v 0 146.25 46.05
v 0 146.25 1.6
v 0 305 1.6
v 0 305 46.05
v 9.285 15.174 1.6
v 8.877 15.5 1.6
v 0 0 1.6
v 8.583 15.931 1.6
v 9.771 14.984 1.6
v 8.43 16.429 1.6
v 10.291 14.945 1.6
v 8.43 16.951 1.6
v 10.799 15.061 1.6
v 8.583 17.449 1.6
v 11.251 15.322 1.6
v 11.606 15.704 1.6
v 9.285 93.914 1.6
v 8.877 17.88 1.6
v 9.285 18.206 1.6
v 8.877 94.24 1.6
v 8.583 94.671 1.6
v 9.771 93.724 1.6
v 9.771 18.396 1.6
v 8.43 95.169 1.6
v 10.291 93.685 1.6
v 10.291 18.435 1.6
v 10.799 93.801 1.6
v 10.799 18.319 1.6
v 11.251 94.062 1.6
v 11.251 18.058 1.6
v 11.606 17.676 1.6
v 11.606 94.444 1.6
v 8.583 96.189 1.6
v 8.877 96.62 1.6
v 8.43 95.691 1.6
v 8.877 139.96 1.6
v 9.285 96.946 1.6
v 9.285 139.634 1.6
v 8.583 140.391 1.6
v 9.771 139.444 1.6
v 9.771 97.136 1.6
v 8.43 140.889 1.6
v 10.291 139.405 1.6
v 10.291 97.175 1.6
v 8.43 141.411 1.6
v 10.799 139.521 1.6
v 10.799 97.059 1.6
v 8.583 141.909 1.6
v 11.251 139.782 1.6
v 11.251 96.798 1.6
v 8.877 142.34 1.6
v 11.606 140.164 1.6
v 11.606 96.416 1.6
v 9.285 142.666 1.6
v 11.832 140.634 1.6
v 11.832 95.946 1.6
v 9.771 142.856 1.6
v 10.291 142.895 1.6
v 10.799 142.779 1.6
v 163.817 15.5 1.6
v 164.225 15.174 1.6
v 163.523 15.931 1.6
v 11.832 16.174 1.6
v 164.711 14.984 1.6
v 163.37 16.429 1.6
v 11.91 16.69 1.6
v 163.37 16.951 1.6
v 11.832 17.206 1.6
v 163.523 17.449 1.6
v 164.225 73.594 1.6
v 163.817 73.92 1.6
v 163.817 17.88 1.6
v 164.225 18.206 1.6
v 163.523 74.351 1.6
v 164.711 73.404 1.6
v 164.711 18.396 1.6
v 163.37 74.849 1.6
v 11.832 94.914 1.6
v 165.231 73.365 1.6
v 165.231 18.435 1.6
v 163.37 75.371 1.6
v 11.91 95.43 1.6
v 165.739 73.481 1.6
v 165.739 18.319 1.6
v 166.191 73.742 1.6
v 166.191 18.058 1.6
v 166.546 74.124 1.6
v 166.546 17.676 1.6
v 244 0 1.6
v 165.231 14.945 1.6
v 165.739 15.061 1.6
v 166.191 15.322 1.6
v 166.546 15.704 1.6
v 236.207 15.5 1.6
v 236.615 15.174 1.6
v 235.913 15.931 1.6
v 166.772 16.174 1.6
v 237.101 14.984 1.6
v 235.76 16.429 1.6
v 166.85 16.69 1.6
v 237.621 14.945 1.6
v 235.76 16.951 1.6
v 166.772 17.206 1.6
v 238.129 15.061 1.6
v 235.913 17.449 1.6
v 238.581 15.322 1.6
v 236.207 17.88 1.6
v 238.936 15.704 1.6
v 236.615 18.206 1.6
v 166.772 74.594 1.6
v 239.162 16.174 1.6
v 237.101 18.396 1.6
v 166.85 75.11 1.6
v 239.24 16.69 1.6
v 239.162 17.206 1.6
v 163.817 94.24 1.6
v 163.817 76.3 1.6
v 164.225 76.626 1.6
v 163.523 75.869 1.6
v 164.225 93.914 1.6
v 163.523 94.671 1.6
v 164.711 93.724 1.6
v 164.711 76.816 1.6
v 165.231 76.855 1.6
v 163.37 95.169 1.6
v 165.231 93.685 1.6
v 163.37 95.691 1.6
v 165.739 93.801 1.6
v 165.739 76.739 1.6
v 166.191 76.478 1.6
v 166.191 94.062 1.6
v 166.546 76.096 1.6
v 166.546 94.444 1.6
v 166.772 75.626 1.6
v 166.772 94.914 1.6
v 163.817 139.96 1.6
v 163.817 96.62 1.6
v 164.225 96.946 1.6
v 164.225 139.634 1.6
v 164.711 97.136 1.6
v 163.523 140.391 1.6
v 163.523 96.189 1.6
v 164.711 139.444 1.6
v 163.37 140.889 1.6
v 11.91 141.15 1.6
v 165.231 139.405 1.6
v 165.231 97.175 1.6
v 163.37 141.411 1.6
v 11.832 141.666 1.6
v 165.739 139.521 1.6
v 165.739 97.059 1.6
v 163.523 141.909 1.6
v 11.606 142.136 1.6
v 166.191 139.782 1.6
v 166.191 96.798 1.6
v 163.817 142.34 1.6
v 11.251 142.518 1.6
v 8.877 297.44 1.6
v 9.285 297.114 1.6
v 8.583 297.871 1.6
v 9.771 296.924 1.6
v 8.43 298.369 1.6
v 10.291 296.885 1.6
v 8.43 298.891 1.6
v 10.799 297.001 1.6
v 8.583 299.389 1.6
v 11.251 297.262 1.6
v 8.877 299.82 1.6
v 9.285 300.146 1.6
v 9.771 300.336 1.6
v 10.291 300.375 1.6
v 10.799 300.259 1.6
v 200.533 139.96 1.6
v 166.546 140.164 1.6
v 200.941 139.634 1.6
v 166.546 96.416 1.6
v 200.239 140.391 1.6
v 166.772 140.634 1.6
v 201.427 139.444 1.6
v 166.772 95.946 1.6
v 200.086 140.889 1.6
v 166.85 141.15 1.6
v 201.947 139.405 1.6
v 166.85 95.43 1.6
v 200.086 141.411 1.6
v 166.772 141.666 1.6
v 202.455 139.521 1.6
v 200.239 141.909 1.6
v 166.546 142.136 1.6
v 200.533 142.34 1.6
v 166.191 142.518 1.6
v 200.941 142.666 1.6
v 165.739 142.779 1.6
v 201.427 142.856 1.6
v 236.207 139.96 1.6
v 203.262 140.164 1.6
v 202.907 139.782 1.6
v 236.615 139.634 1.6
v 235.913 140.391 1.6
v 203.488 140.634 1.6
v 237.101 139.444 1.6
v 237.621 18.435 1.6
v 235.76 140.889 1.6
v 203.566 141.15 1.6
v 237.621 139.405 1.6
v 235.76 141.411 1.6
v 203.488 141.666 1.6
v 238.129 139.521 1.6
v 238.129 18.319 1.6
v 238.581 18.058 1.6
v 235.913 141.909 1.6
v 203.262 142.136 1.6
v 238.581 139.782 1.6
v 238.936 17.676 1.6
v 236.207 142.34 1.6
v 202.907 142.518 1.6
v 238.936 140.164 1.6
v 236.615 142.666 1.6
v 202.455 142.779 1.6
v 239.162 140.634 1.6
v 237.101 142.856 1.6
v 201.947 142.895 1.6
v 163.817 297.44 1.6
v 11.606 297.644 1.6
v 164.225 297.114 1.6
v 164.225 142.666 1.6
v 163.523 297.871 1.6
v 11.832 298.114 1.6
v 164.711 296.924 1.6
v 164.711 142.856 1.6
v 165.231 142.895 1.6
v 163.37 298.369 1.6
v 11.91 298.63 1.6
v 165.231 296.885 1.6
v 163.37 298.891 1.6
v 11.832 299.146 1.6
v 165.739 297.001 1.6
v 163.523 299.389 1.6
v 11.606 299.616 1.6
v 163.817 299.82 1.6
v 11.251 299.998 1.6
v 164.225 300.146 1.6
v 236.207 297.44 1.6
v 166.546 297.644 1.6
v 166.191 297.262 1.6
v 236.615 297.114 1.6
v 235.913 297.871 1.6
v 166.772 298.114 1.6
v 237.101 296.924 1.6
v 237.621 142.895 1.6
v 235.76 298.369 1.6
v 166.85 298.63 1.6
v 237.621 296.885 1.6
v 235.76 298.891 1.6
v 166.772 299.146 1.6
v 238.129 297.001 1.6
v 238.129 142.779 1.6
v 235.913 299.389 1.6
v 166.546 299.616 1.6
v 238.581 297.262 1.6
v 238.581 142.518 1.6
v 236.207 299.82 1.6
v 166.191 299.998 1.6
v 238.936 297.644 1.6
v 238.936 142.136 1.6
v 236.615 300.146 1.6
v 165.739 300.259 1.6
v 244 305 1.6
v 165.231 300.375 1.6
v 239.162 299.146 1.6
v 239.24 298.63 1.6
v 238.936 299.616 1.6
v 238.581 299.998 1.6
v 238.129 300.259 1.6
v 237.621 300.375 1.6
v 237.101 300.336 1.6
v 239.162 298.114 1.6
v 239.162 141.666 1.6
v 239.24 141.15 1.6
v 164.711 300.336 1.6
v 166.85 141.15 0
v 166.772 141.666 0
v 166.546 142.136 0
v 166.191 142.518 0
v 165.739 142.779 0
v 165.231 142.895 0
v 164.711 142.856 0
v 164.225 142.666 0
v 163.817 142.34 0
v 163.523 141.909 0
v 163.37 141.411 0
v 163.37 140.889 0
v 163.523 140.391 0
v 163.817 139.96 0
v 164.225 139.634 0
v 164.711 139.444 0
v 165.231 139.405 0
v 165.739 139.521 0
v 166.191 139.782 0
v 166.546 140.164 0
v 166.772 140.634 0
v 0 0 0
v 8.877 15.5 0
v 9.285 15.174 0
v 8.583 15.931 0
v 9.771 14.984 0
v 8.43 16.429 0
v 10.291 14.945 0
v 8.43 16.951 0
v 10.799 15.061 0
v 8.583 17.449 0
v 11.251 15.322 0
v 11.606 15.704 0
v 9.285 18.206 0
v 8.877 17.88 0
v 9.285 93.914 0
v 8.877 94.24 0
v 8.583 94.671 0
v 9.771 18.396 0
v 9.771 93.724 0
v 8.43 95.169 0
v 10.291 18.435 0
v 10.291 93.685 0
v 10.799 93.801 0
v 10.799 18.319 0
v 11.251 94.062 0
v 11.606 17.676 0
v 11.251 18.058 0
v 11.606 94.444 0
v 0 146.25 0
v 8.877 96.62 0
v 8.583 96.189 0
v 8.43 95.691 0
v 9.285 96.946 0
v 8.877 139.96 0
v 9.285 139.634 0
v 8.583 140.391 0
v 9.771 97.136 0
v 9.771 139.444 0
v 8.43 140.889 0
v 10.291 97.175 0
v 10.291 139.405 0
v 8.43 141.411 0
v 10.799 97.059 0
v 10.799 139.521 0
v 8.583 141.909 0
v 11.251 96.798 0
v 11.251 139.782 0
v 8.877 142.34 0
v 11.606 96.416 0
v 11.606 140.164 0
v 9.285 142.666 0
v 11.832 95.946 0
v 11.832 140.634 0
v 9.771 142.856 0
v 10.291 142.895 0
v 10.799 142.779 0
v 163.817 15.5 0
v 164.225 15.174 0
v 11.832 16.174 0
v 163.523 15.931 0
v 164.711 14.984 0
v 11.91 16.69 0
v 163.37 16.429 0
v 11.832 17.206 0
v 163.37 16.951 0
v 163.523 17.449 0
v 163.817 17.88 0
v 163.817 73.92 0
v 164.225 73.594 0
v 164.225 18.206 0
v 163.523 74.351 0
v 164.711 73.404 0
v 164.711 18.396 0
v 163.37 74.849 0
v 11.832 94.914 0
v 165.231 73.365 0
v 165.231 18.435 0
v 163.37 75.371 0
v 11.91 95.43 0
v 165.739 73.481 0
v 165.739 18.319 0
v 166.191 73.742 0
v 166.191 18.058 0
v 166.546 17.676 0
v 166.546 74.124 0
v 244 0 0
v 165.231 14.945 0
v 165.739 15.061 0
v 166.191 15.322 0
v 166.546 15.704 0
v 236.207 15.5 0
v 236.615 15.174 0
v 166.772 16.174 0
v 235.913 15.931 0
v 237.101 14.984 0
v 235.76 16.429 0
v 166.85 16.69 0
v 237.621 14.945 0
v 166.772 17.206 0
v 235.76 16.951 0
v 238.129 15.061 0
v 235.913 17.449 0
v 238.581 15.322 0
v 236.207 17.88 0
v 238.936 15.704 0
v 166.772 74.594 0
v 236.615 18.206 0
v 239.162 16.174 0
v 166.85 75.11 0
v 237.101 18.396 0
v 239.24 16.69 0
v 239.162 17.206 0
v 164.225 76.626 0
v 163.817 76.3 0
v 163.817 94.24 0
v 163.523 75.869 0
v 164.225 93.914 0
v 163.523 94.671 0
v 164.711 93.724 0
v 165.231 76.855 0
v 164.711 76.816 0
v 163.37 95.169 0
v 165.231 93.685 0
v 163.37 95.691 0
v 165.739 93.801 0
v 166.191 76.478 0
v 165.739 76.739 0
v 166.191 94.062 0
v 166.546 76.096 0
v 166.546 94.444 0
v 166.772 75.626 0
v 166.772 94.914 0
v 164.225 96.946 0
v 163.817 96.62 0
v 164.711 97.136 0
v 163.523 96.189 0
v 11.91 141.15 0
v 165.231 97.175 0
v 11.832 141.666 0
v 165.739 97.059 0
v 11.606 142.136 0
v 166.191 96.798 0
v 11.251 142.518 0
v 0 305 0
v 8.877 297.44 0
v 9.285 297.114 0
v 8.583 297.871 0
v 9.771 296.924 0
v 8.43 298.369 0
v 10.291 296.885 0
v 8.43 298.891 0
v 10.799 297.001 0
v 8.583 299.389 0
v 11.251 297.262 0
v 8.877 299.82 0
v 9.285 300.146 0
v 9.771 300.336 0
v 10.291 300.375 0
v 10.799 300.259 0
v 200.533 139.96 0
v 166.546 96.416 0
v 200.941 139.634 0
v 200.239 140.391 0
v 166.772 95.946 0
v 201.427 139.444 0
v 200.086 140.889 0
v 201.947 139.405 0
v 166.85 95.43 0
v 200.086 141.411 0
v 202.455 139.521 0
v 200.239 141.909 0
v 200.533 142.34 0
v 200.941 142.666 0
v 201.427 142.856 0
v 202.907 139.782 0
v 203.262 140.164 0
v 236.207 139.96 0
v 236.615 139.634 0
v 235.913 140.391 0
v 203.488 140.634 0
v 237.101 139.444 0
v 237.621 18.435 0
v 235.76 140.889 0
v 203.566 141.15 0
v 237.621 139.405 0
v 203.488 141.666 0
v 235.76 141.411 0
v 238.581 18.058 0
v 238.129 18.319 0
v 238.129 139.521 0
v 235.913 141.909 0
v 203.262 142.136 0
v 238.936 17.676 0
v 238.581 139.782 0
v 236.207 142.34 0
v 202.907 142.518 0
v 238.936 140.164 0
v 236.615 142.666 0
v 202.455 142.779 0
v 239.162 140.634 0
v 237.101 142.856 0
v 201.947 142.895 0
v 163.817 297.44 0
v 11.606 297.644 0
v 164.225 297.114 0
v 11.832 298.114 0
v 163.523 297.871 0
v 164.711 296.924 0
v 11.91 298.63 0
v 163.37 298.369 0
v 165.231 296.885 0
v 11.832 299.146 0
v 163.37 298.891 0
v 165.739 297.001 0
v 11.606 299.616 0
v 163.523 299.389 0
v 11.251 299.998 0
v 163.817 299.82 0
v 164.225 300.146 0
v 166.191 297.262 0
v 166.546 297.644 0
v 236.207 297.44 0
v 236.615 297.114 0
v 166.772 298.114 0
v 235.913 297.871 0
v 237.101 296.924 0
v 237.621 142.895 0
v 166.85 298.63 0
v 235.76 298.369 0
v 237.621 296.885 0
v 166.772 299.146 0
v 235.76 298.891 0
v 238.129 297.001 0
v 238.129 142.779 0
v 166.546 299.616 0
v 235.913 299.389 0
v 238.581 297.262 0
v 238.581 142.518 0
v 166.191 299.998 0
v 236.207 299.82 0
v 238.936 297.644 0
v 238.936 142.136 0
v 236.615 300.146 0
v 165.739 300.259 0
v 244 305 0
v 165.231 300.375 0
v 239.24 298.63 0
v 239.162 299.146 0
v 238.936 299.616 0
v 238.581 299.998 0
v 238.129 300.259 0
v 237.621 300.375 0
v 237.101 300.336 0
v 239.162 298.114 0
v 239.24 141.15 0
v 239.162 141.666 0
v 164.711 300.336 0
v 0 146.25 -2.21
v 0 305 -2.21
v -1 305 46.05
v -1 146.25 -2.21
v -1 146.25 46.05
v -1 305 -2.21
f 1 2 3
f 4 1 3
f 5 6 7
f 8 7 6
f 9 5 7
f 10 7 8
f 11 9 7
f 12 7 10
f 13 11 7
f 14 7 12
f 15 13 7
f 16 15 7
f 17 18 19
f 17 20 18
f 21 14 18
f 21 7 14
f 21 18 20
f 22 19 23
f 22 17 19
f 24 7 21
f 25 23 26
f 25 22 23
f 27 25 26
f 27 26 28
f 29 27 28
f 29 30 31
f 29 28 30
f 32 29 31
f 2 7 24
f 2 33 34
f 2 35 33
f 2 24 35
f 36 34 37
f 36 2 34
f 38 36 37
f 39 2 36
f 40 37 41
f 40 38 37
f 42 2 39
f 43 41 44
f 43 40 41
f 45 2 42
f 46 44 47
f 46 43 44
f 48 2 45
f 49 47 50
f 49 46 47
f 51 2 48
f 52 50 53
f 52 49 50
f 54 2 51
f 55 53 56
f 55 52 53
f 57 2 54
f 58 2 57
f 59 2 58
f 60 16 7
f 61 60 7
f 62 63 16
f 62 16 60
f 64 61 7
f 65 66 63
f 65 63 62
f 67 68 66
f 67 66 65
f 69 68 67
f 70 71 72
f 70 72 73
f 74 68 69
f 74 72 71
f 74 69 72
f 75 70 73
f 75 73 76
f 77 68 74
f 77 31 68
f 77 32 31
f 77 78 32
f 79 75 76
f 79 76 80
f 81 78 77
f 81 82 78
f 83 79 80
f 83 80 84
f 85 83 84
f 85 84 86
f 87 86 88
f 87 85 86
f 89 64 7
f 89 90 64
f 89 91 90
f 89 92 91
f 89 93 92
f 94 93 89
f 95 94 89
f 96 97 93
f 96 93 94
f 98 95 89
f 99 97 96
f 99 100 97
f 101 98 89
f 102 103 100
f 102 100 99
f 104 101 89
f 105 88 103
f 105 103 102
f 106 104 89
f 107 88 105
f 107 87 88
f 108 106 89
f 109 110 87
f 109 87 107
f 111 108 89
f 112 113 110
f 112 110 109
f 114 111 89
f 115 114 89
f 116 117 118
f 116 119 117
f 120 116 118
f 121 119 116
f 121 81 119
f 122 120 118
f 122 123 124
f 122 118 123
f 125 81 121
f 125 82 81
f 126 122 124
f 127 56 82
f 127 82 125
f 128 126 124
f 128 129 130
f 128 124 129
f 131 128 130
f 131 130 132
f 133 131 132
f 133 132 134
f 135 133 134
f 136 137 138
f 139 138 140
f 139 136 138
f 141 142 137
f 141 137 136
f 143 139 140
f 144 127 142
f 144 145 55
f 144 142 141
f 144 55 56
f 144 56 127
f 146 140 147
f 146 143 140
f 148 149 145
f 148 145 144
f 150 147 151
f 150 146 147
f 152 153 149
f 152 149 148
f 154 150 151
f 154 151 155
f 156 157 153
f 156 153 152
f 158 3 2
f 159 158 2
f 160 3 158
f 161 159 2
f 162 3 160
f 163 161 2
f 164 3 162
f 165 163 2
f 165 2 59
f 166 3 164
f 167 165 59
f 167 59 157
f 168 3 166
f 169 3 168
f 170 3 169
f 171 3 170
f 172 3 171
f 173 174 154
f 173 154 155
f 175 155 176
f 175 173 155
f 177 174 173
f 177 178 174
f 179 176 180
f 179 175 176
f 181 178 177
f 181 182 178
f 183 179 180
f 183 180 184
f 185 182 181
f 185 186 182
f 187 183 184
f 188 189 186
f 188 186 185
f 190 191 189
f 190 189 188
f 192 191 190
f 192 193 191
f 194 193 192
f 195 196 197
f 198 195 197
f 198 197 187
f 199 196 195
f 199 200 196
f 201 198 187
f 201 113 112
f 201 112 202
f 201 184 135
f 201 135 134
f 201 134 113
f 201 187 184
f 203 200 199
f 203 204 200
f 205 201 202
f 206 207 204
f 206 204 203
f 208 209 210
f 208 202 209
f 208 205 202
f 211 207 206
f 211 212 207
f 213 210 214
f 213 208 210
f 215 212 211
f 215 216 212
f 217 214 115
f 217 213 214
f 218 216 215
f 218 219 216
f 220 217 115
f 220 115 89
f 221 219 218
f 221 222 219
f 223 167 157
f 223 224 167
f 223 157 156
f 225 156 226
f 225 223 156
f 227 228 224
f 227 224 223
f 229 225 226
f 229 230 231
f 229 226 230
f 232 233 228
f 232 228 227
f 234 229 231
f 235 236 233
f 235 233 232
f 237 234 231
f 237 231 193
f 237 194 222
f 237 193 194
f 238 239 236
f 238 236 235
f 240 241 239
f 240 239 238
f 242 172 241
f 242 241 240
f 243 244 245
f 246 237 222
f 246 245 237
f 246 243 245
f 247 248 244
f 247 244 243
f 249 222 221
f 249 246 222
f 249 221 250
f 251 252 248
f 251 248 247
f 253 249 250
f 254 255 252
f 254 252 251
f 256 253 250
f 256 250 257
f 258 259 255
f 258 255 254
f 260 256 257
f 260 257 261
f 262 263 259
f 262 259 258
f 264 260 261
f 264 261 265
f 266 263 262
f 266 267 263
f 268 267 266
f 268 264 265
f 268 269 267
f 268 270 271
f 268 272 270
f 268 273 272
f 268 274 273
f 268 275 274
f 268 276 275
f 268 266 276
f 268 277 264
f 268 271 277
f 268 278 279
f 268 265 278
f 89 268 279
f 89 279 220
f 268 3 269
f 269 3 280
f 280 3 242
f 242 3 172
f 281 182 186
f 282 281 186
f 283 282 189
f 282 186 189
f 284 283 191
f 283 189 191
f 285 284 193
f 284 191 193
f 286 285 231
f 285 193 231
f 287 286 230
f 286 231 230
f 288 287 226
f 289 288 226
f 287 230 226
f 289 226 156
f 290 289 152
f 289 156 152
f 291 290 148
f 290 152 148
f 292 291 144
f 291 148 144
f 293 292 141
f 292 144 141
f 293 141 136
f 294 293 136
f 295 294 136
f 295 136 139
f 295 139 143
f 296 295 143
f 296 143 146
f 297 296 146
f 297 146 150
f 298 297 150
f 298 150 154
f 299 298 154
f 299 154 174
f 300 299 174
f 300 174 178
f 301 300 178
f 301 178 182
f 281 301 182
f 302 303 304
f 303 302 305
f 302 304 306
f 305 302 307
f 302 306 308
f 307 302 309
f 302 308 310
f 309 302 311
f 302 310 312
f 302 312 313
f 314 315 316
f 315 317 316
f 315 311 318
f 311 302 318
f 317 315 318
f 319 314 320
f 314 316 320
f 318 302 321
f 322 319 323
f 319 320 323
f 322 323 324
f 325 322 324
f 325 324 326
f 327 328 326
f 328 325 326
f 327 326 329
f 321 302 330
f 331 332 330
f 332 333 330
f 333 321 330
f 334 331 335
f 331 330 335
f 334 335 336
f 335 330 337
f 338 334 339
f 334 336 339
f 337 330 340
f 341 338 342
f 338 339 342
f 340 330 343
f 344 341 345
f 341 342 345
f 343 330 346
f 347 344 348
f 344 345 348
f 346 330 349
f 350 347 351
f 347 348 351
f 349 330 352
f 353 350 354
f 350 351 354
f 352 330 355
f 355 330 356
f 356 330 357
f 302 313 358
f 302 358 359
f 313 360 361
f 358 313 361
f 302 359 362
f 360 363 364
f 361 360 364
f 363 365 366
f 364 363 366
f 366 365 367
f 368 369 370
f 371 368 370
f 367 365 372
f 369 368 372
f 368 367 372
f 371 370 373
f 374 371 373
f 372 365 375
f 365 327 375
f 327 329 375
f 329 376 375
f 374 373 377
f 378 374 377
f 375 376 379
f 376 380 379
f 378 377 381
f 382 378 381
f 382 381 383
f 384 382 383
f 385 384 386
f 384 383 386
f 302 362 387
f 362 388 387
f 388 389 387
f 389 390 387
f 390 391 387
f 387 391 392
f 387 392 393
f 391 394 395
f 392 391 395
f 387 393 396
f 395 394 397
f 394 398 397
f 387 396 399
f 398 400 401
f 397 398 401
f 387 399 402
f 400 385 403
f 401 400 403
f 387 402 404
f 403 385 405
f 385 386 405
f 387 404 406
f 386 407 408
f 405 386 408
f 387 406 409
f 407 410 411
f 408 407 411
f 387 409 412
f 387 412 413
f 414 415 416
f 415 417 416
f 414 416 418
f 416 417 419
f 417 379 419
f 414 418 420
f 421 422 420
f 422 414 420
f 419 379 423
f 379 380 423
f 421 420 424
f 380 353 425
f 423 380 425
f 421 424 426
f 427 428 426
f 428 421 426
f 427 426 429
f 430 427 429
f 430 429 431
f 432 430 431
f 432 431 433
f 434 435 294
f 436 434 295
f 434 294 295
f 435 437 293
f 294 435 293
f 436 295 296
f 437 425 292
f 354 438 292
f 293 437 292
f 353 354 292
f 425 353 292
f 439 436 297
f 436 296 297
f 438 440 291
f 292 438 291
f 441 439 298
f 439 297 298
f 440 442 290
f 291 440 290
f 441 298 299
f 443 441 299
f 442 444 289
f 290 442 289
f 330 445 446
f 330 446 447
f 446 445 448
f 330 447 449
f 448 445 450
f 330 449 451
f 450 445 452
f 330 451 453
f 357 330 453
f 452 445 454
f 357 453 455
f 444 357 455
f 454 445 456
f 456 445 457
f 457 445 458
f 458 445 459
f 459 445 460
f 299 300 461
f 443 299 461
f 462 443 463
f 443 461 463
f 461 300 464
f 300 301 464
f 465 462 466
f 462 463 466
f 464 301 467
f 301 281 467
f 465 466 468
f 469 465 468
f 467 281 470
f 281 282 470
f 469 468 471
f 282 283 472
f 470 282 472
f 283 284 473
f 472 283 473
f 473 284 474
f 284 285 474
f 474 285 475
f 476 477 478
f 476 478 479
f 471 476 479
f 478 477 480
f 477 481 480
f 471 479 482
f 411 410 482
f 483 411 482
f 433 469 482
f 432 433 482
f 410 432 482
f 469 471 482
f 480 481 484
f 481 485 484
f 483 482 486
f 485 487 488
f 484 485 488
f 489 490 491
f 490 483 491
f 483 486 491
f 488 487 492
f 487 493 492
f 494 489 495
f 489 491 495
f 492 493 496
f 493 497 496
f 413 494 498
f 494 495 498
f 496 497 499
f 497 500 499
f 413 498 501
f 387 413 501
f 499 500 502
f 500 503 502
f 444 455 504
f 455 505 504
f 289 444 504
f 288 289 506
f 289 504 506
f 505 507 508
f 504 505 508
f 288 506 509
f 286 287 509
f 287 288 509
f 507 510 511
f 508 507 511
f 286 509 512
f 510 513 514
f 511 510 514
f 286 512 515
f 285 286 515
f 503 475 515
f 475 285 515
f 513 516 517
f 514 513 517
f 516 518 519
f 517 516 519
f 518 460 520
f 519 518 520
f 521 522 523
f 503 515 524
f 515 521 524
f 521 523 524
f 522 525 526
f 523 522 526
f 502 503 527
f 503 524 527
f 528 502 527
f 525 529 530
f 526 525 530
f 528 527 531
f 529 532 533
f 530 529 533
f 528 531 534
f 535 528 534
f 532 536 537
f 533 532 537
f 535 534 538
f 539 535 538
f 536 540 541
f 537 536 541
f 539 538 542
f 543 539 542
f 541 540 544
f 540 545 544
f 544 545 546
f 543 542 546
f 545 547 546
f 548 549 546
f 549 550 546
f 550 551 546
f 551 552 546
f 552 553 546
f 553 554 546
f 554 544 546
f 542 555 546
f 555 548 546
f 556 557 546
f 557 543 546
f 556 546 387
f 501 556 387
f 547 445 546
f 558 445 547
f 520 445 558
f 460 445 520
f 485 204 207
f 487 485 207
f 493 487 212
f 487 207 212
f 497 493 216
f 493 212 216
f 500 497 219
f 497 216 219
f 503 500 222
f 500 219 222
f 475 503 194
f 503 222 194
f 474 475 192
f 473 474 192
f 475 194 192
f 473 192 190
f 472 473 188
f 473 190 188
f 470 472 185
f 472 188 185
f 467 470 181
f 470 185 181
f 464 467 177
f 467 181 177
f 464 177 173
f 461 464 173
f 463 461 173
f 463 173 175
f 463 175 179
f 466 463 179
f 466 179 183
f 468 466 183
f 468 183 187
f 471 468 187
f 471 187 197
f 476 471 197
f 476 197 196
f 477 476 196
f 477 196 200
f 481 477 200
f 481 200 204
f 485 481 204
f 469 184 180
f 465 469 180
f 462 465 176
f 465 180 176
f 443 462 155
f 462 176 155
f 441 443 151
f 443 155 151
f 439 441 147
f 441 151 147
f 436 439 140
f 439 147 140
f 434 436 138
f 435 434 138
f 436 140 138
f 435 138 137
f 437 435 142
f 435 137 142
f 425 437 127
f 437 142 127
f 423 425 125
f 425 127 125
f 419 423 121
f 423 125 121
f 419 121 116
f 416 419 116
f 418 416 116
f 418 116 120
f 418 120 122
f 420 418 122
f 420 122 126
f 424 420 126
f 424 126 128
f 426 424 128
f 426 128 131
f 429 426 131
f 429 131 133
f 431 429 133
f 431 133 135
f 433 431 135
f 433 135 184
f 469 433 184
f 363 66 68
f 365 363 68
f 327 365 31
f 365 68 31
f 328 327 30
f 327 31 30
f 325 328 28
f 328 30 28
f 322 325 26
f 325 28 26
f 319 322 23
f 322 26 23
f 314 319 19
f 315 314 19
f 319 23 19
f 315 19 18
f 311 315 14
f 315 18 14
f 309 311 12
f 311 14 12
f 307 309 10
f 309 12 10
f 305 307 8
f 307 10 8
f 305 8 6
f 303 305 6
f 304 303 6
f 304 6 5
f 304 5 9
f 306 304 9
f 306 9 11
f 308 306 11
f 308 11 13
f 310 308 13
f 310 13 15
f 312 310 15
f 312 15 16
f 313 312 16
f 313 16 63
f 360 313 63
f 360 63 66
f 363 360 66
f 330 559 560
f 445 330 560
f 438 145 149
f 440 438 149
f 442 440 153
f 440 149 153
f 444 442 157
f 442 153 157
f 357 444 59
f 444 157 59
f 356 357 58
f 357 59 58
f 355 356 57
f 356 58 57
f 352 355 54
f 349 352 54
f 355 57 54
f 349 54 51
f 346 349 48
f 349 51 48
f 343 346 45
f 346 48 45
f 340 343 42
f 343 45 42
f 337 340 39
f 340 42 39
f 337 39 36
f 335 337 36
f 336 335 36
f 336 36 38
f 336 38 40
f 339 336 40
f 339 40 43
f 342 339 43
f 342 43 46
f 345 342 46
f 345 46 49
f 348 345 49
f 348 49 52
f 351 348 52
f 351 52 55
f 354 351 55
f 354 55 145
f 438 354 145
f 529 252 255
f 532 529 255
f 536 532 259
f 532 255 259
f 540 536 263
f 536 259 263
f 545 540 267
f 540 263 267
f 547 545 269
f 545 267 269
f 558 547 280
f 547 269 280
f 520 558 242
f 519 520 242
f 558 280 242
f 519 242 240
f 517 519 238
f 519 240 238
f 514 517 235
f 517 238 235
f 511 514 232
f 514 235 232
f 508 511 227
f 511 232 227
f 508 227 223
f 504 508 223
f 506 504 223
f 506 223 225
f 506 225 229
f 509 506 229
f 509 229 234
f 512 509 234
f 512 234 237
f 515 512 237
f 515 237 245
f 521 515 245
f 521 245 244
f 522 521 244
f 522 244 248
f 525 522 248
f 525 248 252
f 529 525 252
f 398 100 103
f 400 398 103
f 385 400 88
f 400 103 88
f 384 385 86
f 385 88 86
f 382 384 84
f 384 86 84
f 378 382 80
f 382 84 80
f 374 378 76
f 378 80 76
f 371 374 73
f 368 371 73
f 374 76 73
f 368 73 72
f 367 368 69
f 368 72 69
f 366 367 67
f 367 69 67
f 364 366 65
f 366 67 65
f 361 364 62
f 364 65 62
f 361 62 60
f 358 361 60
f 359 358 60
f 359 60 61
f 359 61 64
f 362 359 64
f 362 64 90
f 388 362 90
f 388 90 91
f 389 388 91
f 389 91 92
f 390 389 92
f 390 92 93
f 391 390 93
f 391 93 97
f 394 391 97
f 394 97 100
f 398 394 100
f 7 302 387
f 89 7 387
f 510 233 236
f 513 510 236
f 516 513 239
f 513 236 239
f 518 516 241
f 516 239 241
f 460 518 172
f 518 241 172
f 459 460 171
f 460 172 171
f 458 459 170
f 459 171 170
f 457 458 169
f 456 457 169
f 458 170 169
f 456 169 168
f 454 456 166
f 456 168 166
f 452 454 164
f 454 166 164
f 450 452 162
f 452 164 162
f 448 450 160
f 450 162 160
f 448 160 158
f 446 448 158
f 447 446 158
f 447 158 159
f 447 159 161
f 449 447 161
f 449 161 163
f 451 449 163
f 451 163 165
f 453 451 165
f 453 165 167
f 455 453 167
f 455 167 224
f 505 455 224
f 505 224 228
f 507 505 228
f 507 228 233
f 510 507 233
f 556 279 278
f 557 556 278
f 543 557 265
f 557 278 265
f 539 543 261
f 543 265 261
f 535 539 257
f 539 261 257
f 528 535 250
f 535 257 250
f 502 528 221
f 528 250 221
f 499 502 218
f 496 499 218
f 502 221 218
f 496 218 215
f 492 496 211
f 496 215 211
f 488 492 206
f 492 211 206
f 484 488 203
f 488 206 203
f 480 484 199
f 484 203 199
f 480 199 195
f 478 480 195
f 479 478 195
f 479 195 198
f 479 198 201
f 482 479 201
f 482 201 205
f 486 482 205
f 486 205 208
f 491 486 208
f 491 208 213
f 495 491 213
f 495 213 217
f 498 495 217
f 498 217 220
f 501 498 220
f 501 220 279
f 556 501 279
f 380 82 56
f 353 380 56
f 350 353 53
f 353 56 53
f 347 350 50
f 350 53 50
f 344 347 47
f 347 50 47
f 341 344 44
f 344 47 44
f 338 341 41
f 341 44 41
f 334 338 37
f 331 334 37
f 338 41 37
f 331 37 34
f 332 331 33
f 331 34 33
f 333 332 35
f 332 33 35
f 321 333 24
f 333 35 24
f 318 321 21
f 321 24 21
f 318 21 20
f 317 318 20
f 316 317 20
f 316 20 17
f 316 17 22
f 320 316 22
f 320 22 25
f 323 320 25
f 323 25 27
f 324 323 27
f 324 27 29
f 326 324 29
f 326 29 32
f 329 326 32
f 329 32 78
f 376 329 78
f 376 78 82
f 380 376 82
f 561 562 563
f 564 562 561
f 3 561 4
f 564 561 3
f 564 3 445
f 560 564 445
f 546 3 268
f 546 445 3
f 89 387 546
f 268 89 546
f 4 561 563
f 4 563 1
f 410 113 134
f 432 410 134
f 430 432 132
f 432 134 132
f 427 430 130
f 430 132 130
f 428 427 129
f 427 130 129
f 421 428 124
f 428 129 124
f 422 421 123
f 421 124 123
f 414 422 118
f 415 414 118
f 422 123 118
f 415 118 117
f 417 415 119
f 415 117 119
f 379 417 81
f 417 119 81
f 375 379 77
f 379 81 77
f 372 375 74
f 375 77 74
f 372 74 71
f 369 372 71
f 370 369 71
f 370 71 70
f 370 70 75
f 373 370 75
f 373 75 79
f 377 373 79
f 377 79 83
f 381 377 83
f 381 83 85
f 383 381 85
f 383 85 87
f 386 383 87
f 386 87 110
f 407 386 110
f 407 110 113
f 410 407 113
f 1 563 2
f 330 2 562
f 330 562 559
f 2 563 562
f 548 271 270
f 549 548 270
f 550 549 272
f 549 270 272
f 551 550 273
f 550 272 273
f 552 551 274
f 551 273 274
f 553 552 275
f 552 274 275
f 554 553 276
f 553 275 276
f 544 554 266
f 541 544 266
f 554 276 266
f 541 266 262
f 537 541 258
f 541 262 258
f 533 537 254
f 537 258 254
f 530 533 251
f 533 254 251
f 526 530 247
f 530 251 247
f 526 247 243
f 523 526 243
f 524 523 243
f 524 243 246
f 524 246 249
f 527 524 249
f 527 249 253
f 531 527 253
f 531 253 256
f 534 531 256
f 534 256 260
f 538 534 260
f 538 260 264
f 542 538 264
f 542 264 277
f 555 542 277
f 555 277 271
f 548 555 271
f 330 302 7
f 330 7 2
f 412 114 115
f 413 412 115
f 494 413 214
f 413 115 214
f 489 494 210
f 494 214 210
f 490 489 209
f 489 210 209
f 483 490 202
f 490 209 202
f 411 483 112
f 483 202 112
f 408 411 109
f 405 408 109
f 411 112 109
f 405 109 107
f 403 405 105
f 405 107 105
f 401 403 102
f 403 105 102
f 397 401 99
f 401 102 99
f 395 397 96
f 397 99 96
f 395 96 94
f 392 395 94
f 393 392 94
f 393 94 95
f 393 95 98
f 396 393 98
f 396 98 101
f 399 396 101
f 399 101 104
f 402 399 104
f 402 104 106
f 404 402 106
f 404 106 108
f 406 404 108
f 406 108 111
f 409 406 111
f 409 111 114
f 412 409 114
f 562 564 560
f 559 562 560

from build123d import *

# Parameters (mm, degrees)
SKETCH_1_W           = 244
SKETCH_1_H           = 305
EXTRUDE_1_DEPTH      = 1.6
SKETCH_2_R           = 1.75
CUT_EXTRUDE_1_DEPTH  = 391.593855558
EXTRUDE_2_DEPTH      = 44.45
EXTRUDE_2_DEPTH_BACK = 3.81
SKETCH_3_W           = 1
SKETCH_3_H           = 158.75


with BuildPart() as part:
    # 草图1 → 凸台-拉伸1 (new body)
    with BuildSketch(Plane.XY):
        with Locations((122, 152.5)):
            Rectangle(SKETCH_1_W, SKETCH_1_H)
    extrude(amount=EXTRUDE_1_DEPTH)

    # 草图2 → 切除-拉伸1 (cut, through all)
    with BuildSketch(Plane.XY.offset(1.6)):
        with Locations((10.16, 16.69)):
            Circle(SKETCH_2_R)
        with Locations((165.1, 16.69)):
            Circle(SKETCH_2_R)
        with Locations((237.49, 16.69)):
            Circle(SKETCH_2_R)
        with Locations((165.1, 75.11)):
            Circle(SKETCH_2_R)
        with Locations((10.16, 95.43)):
            Circle(SKETCH_2_R)
        with Locations((165.1, 95.43)):
            Circle(SKETCH_2_R)
        with Locations((10.16, 141.15)):
            Circle(SKETCH_2_R)
        with Locations((165.1, 141.15)):
            Circle(SKETCH_2_R)
        with Locations((237.49, 141.15)):
            Circle(SKETCH_2_R)
        with Locations((10.16, 298.63)):
            Circle(SKETCH_2_R)
        with Locations((165.1, 298.63)):
            Circle(SKETCH_2_R)
        with Locations((237.49, 298.63)):
            Circle(SKETCH_2_R)
        with Locations((201.816, 141.15)):
            Circle(SKETCH_2_R)
    extrude(amount=-CUT_EXTRUDE_1_DEPTH, mode=Mode.SUBTRACT)

    # 草图3 → 凸台-拉伸2 (add, two sides: drawn at the far end of the back side and taken through both)
    with BuildSketch(Plane.XY.offset(1.6).offset(-EXTRUDE_2_DEPTH_BACK)):
        with Locations((-0.5, 225.625)):
            Rectangle(SKETCH_3_W, SKETCH_3_H)
    extrude(amount=EXTRUDE_2_DEPTH + EXTRUDE_2_DEPTH_BACK)


solid = part.part
